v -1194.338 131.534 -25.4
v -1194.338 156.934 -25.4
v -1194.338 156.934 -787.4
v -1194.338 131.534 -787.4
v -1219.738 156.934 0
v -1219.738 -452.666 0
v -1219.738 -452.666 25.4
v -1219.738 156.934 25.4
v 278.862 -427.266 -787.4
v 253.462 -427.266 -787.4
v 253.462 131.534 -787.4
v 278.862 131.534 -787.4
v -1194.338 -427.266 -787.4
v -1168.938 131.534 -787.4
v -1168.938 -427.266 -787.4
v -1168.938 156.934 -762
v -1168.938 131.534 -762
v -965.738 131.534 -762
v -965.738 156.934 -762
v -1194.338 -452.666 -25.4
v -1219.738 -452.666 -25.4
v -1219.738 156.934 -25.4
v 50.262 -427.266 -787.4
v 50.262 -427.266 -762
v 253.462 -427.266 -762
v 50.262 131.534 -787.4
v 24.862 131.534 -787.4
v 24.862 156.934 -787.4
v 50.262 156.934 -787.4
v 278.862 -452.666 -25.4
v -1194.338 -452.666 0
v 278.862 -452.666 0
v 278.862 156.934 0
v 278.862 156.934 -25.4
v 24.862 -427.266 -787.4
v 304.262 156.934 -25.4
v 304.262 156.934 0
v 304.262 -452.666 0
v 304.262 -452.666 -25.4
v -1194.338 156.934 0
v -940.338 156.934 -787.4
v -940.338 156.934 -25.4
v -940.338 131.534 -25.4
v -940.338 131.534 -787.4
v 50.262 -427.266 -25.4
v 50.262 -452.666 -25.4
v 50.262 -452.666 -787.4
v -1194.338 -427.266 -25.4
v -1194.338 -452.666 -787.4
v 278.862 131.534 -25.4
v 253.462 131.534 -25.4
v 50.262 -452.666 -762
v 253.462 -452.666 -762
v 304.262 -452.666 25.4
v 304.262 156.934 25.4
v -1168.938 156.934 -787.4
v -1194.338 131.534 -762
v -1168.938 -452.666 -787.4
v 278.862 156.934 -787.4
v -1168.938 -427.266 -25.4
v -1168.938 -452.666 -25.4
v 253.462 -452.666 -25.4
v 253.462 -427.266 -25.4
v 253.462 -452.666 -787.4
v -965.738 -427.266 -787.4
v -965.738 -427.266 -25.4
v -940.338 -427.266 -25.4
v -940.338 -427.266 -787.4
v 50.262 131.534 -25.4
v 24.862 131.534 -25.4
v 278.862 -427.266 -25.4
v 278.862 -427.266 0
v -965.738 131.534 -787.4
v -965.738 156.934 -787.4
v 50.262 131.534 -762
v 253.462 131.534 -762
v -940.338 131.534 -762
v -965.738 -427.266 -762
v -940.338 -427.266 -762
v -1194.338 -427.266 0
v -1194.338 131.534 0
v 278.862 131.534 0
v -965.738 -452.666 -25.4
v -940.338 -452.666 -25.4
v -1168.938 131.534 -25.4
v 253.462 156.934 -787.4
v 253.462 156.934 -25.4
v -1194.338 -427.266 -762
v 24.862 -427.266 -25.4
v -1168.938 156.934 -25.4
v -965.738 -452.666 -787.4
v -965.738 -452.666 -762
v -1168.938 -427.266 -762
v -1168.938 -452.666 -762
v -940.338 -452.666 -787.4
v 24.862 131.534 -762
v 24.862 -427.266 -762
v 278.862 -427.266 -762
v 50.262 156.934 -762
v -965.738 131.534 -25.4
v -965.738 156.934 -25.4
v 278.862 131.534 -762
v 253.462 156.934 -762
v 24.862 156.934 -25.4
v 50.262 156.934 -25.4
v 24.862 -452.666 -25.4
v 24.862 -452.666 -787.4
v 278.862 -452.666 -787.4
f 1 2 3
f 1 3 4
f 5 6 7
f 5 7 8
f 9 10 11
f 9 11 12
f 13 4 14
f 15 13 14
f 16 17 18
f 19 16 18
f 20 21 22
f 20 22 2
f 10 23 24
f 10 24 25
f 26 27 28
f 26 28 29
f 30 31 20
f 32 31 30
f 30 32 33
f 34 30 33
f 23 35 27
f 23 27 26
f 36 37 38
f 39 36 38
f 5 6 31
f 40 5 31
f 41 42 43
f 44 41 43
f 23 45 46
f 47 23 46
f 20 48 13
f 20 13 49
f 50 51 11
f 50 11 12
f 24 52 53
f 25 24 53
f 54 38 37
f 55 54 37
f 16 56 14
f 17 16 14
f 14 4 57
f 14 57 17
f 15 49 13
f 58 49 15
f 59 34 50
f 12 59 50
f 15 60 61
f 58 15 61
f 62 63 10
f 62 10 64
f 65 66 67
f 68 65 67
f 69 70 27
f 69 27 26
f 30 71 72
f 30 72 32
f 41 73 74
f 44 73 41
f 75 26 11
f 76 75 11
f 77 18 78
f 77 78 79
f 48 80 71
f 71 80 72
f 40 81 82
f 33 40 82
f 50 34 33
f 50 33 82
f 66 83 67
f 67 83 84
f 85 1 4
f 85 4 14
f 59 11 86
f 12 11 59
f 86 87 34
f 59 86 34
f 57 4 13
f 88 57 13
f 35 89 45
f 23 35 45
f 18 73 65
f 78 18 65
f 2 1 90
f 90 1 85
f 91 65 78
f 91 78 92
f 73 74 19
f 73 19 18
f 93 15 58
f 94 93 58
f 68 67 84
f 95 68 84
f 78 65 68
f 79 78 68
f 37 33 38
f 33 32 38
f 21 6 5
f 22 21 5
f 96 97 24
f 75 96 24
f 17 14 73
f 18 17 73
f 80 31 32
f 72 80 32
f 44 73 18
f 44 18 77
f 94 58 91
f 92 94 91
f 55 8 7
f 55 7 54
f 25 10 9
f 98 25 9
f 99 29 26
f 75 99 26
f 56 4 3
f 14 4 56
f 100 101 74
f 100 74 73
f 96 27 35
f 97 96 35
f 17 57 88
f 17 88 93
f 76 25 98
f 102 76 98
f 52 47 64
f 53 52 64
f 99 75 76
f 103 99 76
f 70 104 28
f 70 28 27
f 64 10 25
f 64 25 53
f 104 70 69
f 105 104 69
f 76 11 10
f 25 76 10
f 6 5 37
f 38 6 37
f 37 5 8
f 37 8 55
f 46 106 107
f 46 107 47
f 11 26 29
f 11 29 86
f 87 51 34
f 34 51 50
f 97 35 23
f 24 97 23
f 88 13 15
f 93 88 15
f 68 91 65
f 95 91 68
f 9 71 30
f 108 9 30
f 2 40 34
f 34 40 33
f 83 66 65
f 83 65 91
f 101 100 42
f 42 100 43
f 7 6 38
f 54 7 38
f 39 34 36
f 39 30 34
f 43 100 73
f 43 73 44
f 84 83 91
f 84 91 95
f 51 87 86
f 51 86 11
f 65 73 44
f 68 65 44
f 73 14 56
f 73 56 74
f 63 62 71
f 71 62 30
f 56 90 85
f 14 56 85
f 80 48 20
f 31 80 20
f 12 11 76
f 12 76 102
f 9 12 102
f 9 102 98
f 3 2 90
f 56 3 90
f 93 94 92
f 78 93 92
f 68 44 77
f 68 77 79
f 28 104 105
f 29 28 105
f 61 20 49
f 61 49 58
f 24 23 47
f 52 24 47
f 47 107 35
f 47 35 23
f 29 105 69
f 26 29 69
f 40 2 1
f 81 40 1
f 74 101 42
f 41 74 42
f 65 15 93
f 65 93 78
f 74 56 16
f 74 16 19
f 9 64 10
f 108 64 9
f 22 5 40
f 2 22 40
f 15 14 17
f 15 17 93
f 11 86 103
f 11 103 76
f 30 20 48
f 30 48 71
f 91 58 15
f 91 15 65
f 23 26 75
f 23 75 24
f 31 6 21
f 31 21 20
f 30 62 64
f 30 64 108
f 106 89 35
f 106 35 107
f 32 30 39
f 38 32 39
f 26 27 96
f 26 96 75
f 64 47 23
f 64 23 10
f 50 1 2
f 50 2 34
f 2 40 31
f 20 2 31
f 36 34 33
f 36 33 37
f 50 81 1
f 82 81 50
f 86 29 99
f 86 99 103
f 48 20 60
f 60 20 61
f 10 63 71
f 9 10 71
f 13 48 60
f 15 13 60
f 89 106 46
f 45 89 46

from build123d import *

# Parameters (mm, degrees)
F0_W     = 1524
F0_H     = 609.6
F1_DEPTH = 25.4
F2_W     = 1473.2
F2_H     = 25.4
F3_DEPTH = 25.4
F2_W_2   = 25.4
F2_H_2   = 558.8
F4_DEPTH = 25.4
F5_W     = 25.4
F5_H     = 25.4
F6_DEPTH = 762
F7_W     = 25.4
F7_H     = 558.8
F7_W_2   = 203.2
F7_H_2   = 25.4
F8_DEPTH = 25.4


with BuildPart() as f1:
    # F0 (on Top) → F1 (new body)
    with BuildSketch(Plane.XY):
        with Locations((-457.737868, -147.86572)):
            Rectangle(F0_W, F0_H)
    extrude(amount=F1_DEPTH)


with BuildPart() as f3:
    # F2 (on face) → F3 (new body)
    with BuildSketch(Plane(origin=(0, 0, 0), x_dir=(1, 0, 0), z_dir=(0, 0, -1))):
        with Locations((-457.737868, -144.23428)):
            Rectangle(F2_W, F2_H)
        with Locations((-457.737868, 439.96572)):
            Rectangle(F2_W, F2_H)
    extrude(amount=F3_DEPTH)


with BuildPart() as f4:
    # F2 (on face) → F4 (new body)
    with BuildSketch(Plane(origin=(0, 0, 0), x_dir=(1, 0, 0), z_dir=(0, 0, -1))):
        with Locations((-1207.037868, 147.86572)):
            Rectangle(F2_W_2, F2_H_2)
        with Locations((291.562132, 147.86572)):
            Rectangle(F2_W_2, F2_H_2)
        with Locations((-1207.037868, 439.96572)):
            Rectangle(F2_W_2, F2_H)
        with Locations((-1207.037868, -144.23428)):
            Rectangle(F2_W_2, F2_H)
        with Locations((291.562132, -144.23428)):
            Rectangle(F2_W_2, F2_H)
        with Locations((291.562132, 439.96572)):
            Rectangle(F2_W_2, F2_H)
    extrude(amount=F4_DEPTH)


with BuildPart() as f6:
    # F5 (on face) → F6 (new body)
    with BuildSketch(Plane(origin=(0, 0, -25.4), x_dir=(1, 0, 0), z_dir=(0, 0, -1))):
        with Locations((-1181.637868, 439.96572)):
            Rectangle(F5_W, F5_H)
        with Locations((-1181.637868, -144.23428)):
            Rectangle(F5_W, F5_H)
        with Locations((266.162132, 439.96572)):
            Rectangle(F5_W, F5_H)
        with Locations((266.162132, -144.23428)):
            Rectangle(F5_W, F5_H)
        with Locations((-953.037868, 439.96572)):
            Rectangle(F5_W, F5_H)
        with Locations((-953.037868, -144.23428)):
            Rectangle(F5_W, F5_H)
        with Locations((37.562132, 439.96572)):
            Rectangle(F5_W, F5_H)
        with Locations((37.562132, -144.23428)):
            Rectangle(F5_W, F5_H)
    extrude(amount=F6_DEPTH)


with BuildPart() as f8:
    # F7 (on face) → F8 (new body)
    with BuildSketch(Plane(origin=(0, 0, -787.4), x_dir=(1, 0, 0), z_dir=(0, 0, -1))):
        with Locations((-1181.637868, 147.86572)):
            Rectangle(F7_W, F7_H)
        with Locations((-1067.337868, 439.96572)):
            Rectangle(F7_W_2, F7_H_2)
        with Locations((-953.037868, 147.86572)):
            Rectangle(F7_W, F7_H)
        with Locations((-1067.337868, -144.23428)):
            Rectangle(F7_W_2, F7_H_2)
        with Locations((37.562132, 147.86572)):
            Rectangle(F7_W, F7_H)
        with Locations((151.862132, 439.96572)):
            Rectangle(F7_W_2, F7_H_2)
        with Locations((151.862132, -144.23428)):
            Rectangle(F7_W_2, F7_H_2)
        with Locations((266.162132, 147.86572)):
            Rectangle(F7_W, F7_H)
    extrude(amount=-F8_DEPTH)


solid = Compound([f1.part, f3.part, f4.part, f6.part, f8.part])
